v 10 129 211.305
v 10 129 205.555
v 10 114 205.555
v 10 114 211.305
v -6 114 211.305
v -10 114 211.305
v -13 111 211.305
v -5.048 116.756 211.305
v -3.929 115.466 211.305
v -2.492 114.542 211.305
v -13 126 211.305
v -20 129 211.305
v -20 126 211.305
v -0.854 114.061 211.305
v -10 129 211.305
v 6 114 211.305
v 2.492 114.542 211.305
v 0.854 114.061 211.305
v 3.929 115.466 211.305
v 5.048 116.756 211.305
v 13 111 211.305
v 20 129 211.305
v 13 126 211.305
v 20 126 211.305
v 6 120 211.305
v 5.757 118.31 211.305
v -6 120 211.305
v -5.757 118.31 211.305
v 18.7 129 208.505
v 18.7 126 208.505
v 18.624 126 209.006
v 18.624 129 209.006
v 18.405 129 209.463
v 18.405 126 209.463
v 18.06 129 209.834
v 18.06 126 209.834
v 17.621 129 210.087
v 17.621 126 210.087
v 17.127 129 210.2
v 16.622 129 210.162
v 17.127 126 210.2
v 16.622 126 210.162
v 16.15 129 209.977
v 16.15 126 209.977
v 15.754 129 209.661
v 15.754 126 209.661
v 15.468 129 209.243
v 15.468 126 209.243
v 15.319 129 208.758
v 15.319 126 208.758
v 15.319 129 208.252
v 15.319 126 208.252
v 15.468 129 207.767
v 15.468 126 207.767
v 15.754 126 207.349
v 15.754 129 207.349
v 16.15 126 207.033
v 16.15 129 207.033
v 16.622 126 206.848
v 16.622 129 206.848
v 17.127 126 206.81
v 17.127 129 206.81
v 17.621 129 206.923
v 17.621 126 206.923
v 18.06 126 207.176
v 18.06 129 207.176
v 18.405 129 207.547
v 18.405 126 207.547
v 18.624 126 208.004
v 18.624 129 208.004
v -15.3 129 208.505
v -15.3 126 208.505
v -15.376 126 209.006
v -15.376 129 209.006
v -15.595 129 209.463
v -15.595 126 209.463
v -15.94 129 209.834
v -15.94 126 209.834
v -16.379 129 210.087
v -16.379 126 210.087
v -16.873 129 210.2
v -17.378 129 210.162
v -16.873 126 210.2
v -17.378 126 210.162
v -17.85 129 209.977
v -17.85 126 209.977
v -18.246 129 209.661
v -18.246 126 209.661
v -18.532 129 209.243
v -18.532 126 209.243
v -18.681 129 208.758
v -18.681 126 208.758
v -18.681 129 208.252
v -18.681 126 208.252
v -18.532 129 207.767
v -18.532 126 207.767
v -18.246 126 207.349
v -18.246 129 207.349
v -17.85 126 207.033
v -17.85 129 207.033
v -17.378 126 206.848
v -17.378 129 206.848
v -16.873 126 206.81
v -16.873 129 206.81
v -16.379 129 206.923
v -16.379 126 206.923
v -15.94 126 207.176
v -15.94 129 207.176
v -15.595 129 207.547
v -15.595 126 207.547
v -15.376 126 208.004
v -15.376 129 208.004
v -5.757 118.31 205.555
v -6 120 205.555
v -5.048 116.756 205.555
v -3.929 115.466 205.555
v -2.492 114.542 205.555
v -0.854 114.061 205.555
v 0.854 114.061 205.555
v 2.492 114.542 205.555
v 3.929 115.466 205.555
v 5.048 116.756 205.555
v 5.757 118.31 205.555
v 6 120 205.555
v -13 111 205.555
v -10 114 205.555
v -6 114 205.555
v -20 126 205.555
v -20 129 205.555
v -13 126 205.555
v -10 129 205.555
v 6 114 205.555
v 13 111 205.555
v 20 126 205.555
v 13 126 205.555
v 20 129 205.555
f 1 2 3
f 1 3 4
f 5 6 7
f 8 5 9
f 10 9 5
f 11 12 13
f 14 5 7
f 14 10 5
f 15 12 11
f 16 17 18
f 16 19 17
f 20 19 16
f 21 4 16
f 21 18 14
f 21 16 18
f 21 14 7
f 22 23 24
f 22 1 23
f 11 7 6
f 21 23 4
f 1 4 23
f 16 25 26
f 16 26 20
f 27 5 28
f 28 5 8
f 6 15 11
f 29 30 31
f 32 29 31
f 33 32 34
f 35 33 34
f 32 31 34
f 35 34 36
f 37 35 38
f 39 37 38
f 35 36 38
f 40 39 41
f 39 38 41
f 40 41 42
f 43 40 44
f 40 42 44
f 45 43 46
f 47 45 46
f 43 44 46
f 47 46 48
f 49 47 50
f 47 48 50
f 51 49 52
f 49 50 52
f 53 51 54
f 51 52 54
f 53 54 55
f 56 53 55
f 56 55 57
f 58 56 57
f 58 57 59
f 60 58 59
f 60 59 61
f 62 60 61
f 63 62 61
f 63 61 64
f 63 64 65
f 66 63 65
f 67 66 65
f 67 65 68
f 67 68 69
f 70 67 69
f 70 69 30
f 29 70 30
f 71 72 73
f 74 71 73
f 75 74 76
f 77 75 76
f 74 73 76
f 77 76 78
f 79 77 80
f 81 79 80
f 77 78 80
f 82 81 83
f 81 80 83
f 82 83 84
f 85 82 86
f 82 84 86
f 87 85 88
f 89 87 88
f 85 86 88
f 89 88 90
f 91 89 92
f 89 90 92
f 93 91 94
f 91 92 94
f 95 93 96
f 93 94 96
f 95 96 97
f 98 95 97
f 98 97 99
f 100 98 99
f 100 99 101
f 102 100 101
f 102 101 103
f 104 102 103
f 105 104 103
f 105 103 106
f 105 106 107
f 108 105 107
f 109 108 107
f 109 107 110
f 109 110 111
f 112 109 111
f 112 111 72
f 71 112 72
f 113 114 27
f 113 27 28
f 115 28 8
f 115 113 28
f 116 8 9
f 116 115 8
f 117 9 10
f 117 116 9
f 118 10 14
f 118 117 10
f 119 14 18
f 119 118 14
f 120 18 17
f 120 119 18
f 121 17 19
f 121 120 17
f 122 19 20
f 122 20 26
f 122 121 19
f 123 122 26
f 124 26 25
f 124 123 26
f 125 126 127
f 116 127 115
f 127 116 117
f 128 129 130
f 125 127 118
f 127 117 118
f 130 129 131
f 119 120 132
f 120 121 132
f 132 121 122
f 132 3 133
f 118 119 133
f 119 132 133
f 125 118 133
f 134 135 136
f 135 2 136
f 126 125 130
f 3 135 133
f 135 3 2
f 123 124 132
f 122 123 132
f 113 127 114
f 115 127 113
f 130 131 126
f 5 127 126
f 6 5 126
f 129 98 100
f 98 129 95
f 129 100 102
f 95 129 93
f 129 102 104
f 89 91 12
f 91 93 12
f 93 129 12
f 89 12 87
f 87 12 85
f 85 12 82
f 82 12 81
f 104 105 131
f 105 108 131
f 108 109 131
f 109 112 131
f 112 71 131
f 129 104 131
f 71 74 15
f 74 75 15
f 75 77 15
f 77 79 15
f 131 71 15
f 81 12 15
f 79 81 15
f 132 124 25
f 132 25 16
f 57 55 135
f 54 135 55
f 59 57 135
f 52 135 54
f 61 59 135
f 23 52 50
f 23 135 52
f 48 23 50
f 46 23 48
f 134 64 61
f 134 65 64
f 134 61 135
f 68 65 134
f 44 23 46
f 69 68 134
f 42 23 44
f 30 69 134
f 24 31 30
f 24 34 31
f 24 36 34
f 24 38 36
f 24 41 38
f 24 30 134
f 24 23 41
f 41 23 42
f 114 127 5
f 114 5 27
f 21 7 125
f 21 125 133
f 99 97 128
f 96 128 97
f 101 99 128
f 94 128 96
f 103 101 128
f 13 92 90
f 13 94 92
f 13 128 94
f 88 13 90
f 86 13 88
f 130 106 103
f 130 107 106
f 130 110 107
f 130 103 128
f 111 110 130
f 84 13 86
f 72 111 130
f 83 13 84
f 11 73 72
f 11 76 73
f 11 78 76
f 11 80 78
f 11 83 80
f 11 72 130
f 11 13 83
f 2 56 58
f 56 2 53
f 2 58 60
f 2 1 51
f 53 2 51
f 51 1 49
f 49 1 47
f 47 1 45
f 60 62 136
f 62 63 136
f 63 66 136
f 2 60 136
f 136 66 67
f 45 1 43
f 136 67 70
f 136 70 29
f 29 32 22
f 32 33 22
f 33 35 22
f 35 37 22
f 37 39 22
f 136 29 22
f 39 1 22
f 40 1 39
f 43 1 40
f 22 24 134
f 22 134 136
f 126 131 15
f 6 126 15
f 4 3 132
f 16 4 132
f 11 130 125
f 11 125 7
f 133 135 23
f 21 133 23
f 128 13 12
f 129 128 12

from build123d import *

# Parameters (mm, degrees)
PAD032_DEPTH  = 5.75
SKETCH096_W   = 3
SKETCH096_H   = 5.75
PAD033_DEPTH  = 18
SKETCH097_W   = 7
SKETCH097_H   = 3
PAD034_DEPTH  = 5.75
SKETCH098_R   = 1.7
HOLE019_DEPTH = 25


with BuildPart() as part:
    # Sketch095 → Pad032 (new body)
    with BuildSketch(Plane.XY):
        with BuildLine():
            Line((-10, 0), (-10, -3))
            Line((-10, -3), (10, -3))
            Line((10, -3), (10, 0))
            Line((10, 0), (6, 0))
            Line((6, 6), (6, 0))
            ThreePointArc((-6, 6), (0, 0), (6, 6))
            Line((-6, 0), (-6, 6))
            Line((-6, 0), (-10, 0))
        make_face()
    extrude(amount=PAD032_DEPTH)

    # Sketch096 → Pad033 (join)
    with BuildSketch(Plane.XZ.offset(3)):
        with Locations((-11.5, 2.875)):
            Rectangle(SKETCH096_W, SKETCH096_H)
        with Locations((11.5, 2.875)):
            Rectangle(SKETCH096_W, SKETCH096_H)
    extrude(amount=-PAD033_DEPTH)

    # Sketch097 (on Face7 of Pad033) → Pad034 (join)
    with BuildSketch(Plane.XY.offset(5.75)):
        with Locations((-16.5, 13.5)):
            Rectangle(SKETCH097_W, SKETCH097_H)
        with Locations((16.5, 13.5)):
            Rectangle(SKETCH097_W, SKETCH097_H)
    extrude(amount=-PAD034_DEPTH)

    # Sketch098 (on Face26 of Pad034) → Hole019 (cut)
    with BuildSketch(Plane.XZ.offset(-12)):
        with Locations((-17, 2.95)):
            Circle(SKETCH098_R)
        with Locations((17, 2.95)):
            Circle(SKETCH098_R)
    extrude(amount=-HOLE019_DEPTH, mode=Mode.SUBTRACT)


with BuildPart() as part_1:
    # Body014 placement: moved
    add(part.part.moved(Location((0, 114, 205.555))))


solid = part_1.part
